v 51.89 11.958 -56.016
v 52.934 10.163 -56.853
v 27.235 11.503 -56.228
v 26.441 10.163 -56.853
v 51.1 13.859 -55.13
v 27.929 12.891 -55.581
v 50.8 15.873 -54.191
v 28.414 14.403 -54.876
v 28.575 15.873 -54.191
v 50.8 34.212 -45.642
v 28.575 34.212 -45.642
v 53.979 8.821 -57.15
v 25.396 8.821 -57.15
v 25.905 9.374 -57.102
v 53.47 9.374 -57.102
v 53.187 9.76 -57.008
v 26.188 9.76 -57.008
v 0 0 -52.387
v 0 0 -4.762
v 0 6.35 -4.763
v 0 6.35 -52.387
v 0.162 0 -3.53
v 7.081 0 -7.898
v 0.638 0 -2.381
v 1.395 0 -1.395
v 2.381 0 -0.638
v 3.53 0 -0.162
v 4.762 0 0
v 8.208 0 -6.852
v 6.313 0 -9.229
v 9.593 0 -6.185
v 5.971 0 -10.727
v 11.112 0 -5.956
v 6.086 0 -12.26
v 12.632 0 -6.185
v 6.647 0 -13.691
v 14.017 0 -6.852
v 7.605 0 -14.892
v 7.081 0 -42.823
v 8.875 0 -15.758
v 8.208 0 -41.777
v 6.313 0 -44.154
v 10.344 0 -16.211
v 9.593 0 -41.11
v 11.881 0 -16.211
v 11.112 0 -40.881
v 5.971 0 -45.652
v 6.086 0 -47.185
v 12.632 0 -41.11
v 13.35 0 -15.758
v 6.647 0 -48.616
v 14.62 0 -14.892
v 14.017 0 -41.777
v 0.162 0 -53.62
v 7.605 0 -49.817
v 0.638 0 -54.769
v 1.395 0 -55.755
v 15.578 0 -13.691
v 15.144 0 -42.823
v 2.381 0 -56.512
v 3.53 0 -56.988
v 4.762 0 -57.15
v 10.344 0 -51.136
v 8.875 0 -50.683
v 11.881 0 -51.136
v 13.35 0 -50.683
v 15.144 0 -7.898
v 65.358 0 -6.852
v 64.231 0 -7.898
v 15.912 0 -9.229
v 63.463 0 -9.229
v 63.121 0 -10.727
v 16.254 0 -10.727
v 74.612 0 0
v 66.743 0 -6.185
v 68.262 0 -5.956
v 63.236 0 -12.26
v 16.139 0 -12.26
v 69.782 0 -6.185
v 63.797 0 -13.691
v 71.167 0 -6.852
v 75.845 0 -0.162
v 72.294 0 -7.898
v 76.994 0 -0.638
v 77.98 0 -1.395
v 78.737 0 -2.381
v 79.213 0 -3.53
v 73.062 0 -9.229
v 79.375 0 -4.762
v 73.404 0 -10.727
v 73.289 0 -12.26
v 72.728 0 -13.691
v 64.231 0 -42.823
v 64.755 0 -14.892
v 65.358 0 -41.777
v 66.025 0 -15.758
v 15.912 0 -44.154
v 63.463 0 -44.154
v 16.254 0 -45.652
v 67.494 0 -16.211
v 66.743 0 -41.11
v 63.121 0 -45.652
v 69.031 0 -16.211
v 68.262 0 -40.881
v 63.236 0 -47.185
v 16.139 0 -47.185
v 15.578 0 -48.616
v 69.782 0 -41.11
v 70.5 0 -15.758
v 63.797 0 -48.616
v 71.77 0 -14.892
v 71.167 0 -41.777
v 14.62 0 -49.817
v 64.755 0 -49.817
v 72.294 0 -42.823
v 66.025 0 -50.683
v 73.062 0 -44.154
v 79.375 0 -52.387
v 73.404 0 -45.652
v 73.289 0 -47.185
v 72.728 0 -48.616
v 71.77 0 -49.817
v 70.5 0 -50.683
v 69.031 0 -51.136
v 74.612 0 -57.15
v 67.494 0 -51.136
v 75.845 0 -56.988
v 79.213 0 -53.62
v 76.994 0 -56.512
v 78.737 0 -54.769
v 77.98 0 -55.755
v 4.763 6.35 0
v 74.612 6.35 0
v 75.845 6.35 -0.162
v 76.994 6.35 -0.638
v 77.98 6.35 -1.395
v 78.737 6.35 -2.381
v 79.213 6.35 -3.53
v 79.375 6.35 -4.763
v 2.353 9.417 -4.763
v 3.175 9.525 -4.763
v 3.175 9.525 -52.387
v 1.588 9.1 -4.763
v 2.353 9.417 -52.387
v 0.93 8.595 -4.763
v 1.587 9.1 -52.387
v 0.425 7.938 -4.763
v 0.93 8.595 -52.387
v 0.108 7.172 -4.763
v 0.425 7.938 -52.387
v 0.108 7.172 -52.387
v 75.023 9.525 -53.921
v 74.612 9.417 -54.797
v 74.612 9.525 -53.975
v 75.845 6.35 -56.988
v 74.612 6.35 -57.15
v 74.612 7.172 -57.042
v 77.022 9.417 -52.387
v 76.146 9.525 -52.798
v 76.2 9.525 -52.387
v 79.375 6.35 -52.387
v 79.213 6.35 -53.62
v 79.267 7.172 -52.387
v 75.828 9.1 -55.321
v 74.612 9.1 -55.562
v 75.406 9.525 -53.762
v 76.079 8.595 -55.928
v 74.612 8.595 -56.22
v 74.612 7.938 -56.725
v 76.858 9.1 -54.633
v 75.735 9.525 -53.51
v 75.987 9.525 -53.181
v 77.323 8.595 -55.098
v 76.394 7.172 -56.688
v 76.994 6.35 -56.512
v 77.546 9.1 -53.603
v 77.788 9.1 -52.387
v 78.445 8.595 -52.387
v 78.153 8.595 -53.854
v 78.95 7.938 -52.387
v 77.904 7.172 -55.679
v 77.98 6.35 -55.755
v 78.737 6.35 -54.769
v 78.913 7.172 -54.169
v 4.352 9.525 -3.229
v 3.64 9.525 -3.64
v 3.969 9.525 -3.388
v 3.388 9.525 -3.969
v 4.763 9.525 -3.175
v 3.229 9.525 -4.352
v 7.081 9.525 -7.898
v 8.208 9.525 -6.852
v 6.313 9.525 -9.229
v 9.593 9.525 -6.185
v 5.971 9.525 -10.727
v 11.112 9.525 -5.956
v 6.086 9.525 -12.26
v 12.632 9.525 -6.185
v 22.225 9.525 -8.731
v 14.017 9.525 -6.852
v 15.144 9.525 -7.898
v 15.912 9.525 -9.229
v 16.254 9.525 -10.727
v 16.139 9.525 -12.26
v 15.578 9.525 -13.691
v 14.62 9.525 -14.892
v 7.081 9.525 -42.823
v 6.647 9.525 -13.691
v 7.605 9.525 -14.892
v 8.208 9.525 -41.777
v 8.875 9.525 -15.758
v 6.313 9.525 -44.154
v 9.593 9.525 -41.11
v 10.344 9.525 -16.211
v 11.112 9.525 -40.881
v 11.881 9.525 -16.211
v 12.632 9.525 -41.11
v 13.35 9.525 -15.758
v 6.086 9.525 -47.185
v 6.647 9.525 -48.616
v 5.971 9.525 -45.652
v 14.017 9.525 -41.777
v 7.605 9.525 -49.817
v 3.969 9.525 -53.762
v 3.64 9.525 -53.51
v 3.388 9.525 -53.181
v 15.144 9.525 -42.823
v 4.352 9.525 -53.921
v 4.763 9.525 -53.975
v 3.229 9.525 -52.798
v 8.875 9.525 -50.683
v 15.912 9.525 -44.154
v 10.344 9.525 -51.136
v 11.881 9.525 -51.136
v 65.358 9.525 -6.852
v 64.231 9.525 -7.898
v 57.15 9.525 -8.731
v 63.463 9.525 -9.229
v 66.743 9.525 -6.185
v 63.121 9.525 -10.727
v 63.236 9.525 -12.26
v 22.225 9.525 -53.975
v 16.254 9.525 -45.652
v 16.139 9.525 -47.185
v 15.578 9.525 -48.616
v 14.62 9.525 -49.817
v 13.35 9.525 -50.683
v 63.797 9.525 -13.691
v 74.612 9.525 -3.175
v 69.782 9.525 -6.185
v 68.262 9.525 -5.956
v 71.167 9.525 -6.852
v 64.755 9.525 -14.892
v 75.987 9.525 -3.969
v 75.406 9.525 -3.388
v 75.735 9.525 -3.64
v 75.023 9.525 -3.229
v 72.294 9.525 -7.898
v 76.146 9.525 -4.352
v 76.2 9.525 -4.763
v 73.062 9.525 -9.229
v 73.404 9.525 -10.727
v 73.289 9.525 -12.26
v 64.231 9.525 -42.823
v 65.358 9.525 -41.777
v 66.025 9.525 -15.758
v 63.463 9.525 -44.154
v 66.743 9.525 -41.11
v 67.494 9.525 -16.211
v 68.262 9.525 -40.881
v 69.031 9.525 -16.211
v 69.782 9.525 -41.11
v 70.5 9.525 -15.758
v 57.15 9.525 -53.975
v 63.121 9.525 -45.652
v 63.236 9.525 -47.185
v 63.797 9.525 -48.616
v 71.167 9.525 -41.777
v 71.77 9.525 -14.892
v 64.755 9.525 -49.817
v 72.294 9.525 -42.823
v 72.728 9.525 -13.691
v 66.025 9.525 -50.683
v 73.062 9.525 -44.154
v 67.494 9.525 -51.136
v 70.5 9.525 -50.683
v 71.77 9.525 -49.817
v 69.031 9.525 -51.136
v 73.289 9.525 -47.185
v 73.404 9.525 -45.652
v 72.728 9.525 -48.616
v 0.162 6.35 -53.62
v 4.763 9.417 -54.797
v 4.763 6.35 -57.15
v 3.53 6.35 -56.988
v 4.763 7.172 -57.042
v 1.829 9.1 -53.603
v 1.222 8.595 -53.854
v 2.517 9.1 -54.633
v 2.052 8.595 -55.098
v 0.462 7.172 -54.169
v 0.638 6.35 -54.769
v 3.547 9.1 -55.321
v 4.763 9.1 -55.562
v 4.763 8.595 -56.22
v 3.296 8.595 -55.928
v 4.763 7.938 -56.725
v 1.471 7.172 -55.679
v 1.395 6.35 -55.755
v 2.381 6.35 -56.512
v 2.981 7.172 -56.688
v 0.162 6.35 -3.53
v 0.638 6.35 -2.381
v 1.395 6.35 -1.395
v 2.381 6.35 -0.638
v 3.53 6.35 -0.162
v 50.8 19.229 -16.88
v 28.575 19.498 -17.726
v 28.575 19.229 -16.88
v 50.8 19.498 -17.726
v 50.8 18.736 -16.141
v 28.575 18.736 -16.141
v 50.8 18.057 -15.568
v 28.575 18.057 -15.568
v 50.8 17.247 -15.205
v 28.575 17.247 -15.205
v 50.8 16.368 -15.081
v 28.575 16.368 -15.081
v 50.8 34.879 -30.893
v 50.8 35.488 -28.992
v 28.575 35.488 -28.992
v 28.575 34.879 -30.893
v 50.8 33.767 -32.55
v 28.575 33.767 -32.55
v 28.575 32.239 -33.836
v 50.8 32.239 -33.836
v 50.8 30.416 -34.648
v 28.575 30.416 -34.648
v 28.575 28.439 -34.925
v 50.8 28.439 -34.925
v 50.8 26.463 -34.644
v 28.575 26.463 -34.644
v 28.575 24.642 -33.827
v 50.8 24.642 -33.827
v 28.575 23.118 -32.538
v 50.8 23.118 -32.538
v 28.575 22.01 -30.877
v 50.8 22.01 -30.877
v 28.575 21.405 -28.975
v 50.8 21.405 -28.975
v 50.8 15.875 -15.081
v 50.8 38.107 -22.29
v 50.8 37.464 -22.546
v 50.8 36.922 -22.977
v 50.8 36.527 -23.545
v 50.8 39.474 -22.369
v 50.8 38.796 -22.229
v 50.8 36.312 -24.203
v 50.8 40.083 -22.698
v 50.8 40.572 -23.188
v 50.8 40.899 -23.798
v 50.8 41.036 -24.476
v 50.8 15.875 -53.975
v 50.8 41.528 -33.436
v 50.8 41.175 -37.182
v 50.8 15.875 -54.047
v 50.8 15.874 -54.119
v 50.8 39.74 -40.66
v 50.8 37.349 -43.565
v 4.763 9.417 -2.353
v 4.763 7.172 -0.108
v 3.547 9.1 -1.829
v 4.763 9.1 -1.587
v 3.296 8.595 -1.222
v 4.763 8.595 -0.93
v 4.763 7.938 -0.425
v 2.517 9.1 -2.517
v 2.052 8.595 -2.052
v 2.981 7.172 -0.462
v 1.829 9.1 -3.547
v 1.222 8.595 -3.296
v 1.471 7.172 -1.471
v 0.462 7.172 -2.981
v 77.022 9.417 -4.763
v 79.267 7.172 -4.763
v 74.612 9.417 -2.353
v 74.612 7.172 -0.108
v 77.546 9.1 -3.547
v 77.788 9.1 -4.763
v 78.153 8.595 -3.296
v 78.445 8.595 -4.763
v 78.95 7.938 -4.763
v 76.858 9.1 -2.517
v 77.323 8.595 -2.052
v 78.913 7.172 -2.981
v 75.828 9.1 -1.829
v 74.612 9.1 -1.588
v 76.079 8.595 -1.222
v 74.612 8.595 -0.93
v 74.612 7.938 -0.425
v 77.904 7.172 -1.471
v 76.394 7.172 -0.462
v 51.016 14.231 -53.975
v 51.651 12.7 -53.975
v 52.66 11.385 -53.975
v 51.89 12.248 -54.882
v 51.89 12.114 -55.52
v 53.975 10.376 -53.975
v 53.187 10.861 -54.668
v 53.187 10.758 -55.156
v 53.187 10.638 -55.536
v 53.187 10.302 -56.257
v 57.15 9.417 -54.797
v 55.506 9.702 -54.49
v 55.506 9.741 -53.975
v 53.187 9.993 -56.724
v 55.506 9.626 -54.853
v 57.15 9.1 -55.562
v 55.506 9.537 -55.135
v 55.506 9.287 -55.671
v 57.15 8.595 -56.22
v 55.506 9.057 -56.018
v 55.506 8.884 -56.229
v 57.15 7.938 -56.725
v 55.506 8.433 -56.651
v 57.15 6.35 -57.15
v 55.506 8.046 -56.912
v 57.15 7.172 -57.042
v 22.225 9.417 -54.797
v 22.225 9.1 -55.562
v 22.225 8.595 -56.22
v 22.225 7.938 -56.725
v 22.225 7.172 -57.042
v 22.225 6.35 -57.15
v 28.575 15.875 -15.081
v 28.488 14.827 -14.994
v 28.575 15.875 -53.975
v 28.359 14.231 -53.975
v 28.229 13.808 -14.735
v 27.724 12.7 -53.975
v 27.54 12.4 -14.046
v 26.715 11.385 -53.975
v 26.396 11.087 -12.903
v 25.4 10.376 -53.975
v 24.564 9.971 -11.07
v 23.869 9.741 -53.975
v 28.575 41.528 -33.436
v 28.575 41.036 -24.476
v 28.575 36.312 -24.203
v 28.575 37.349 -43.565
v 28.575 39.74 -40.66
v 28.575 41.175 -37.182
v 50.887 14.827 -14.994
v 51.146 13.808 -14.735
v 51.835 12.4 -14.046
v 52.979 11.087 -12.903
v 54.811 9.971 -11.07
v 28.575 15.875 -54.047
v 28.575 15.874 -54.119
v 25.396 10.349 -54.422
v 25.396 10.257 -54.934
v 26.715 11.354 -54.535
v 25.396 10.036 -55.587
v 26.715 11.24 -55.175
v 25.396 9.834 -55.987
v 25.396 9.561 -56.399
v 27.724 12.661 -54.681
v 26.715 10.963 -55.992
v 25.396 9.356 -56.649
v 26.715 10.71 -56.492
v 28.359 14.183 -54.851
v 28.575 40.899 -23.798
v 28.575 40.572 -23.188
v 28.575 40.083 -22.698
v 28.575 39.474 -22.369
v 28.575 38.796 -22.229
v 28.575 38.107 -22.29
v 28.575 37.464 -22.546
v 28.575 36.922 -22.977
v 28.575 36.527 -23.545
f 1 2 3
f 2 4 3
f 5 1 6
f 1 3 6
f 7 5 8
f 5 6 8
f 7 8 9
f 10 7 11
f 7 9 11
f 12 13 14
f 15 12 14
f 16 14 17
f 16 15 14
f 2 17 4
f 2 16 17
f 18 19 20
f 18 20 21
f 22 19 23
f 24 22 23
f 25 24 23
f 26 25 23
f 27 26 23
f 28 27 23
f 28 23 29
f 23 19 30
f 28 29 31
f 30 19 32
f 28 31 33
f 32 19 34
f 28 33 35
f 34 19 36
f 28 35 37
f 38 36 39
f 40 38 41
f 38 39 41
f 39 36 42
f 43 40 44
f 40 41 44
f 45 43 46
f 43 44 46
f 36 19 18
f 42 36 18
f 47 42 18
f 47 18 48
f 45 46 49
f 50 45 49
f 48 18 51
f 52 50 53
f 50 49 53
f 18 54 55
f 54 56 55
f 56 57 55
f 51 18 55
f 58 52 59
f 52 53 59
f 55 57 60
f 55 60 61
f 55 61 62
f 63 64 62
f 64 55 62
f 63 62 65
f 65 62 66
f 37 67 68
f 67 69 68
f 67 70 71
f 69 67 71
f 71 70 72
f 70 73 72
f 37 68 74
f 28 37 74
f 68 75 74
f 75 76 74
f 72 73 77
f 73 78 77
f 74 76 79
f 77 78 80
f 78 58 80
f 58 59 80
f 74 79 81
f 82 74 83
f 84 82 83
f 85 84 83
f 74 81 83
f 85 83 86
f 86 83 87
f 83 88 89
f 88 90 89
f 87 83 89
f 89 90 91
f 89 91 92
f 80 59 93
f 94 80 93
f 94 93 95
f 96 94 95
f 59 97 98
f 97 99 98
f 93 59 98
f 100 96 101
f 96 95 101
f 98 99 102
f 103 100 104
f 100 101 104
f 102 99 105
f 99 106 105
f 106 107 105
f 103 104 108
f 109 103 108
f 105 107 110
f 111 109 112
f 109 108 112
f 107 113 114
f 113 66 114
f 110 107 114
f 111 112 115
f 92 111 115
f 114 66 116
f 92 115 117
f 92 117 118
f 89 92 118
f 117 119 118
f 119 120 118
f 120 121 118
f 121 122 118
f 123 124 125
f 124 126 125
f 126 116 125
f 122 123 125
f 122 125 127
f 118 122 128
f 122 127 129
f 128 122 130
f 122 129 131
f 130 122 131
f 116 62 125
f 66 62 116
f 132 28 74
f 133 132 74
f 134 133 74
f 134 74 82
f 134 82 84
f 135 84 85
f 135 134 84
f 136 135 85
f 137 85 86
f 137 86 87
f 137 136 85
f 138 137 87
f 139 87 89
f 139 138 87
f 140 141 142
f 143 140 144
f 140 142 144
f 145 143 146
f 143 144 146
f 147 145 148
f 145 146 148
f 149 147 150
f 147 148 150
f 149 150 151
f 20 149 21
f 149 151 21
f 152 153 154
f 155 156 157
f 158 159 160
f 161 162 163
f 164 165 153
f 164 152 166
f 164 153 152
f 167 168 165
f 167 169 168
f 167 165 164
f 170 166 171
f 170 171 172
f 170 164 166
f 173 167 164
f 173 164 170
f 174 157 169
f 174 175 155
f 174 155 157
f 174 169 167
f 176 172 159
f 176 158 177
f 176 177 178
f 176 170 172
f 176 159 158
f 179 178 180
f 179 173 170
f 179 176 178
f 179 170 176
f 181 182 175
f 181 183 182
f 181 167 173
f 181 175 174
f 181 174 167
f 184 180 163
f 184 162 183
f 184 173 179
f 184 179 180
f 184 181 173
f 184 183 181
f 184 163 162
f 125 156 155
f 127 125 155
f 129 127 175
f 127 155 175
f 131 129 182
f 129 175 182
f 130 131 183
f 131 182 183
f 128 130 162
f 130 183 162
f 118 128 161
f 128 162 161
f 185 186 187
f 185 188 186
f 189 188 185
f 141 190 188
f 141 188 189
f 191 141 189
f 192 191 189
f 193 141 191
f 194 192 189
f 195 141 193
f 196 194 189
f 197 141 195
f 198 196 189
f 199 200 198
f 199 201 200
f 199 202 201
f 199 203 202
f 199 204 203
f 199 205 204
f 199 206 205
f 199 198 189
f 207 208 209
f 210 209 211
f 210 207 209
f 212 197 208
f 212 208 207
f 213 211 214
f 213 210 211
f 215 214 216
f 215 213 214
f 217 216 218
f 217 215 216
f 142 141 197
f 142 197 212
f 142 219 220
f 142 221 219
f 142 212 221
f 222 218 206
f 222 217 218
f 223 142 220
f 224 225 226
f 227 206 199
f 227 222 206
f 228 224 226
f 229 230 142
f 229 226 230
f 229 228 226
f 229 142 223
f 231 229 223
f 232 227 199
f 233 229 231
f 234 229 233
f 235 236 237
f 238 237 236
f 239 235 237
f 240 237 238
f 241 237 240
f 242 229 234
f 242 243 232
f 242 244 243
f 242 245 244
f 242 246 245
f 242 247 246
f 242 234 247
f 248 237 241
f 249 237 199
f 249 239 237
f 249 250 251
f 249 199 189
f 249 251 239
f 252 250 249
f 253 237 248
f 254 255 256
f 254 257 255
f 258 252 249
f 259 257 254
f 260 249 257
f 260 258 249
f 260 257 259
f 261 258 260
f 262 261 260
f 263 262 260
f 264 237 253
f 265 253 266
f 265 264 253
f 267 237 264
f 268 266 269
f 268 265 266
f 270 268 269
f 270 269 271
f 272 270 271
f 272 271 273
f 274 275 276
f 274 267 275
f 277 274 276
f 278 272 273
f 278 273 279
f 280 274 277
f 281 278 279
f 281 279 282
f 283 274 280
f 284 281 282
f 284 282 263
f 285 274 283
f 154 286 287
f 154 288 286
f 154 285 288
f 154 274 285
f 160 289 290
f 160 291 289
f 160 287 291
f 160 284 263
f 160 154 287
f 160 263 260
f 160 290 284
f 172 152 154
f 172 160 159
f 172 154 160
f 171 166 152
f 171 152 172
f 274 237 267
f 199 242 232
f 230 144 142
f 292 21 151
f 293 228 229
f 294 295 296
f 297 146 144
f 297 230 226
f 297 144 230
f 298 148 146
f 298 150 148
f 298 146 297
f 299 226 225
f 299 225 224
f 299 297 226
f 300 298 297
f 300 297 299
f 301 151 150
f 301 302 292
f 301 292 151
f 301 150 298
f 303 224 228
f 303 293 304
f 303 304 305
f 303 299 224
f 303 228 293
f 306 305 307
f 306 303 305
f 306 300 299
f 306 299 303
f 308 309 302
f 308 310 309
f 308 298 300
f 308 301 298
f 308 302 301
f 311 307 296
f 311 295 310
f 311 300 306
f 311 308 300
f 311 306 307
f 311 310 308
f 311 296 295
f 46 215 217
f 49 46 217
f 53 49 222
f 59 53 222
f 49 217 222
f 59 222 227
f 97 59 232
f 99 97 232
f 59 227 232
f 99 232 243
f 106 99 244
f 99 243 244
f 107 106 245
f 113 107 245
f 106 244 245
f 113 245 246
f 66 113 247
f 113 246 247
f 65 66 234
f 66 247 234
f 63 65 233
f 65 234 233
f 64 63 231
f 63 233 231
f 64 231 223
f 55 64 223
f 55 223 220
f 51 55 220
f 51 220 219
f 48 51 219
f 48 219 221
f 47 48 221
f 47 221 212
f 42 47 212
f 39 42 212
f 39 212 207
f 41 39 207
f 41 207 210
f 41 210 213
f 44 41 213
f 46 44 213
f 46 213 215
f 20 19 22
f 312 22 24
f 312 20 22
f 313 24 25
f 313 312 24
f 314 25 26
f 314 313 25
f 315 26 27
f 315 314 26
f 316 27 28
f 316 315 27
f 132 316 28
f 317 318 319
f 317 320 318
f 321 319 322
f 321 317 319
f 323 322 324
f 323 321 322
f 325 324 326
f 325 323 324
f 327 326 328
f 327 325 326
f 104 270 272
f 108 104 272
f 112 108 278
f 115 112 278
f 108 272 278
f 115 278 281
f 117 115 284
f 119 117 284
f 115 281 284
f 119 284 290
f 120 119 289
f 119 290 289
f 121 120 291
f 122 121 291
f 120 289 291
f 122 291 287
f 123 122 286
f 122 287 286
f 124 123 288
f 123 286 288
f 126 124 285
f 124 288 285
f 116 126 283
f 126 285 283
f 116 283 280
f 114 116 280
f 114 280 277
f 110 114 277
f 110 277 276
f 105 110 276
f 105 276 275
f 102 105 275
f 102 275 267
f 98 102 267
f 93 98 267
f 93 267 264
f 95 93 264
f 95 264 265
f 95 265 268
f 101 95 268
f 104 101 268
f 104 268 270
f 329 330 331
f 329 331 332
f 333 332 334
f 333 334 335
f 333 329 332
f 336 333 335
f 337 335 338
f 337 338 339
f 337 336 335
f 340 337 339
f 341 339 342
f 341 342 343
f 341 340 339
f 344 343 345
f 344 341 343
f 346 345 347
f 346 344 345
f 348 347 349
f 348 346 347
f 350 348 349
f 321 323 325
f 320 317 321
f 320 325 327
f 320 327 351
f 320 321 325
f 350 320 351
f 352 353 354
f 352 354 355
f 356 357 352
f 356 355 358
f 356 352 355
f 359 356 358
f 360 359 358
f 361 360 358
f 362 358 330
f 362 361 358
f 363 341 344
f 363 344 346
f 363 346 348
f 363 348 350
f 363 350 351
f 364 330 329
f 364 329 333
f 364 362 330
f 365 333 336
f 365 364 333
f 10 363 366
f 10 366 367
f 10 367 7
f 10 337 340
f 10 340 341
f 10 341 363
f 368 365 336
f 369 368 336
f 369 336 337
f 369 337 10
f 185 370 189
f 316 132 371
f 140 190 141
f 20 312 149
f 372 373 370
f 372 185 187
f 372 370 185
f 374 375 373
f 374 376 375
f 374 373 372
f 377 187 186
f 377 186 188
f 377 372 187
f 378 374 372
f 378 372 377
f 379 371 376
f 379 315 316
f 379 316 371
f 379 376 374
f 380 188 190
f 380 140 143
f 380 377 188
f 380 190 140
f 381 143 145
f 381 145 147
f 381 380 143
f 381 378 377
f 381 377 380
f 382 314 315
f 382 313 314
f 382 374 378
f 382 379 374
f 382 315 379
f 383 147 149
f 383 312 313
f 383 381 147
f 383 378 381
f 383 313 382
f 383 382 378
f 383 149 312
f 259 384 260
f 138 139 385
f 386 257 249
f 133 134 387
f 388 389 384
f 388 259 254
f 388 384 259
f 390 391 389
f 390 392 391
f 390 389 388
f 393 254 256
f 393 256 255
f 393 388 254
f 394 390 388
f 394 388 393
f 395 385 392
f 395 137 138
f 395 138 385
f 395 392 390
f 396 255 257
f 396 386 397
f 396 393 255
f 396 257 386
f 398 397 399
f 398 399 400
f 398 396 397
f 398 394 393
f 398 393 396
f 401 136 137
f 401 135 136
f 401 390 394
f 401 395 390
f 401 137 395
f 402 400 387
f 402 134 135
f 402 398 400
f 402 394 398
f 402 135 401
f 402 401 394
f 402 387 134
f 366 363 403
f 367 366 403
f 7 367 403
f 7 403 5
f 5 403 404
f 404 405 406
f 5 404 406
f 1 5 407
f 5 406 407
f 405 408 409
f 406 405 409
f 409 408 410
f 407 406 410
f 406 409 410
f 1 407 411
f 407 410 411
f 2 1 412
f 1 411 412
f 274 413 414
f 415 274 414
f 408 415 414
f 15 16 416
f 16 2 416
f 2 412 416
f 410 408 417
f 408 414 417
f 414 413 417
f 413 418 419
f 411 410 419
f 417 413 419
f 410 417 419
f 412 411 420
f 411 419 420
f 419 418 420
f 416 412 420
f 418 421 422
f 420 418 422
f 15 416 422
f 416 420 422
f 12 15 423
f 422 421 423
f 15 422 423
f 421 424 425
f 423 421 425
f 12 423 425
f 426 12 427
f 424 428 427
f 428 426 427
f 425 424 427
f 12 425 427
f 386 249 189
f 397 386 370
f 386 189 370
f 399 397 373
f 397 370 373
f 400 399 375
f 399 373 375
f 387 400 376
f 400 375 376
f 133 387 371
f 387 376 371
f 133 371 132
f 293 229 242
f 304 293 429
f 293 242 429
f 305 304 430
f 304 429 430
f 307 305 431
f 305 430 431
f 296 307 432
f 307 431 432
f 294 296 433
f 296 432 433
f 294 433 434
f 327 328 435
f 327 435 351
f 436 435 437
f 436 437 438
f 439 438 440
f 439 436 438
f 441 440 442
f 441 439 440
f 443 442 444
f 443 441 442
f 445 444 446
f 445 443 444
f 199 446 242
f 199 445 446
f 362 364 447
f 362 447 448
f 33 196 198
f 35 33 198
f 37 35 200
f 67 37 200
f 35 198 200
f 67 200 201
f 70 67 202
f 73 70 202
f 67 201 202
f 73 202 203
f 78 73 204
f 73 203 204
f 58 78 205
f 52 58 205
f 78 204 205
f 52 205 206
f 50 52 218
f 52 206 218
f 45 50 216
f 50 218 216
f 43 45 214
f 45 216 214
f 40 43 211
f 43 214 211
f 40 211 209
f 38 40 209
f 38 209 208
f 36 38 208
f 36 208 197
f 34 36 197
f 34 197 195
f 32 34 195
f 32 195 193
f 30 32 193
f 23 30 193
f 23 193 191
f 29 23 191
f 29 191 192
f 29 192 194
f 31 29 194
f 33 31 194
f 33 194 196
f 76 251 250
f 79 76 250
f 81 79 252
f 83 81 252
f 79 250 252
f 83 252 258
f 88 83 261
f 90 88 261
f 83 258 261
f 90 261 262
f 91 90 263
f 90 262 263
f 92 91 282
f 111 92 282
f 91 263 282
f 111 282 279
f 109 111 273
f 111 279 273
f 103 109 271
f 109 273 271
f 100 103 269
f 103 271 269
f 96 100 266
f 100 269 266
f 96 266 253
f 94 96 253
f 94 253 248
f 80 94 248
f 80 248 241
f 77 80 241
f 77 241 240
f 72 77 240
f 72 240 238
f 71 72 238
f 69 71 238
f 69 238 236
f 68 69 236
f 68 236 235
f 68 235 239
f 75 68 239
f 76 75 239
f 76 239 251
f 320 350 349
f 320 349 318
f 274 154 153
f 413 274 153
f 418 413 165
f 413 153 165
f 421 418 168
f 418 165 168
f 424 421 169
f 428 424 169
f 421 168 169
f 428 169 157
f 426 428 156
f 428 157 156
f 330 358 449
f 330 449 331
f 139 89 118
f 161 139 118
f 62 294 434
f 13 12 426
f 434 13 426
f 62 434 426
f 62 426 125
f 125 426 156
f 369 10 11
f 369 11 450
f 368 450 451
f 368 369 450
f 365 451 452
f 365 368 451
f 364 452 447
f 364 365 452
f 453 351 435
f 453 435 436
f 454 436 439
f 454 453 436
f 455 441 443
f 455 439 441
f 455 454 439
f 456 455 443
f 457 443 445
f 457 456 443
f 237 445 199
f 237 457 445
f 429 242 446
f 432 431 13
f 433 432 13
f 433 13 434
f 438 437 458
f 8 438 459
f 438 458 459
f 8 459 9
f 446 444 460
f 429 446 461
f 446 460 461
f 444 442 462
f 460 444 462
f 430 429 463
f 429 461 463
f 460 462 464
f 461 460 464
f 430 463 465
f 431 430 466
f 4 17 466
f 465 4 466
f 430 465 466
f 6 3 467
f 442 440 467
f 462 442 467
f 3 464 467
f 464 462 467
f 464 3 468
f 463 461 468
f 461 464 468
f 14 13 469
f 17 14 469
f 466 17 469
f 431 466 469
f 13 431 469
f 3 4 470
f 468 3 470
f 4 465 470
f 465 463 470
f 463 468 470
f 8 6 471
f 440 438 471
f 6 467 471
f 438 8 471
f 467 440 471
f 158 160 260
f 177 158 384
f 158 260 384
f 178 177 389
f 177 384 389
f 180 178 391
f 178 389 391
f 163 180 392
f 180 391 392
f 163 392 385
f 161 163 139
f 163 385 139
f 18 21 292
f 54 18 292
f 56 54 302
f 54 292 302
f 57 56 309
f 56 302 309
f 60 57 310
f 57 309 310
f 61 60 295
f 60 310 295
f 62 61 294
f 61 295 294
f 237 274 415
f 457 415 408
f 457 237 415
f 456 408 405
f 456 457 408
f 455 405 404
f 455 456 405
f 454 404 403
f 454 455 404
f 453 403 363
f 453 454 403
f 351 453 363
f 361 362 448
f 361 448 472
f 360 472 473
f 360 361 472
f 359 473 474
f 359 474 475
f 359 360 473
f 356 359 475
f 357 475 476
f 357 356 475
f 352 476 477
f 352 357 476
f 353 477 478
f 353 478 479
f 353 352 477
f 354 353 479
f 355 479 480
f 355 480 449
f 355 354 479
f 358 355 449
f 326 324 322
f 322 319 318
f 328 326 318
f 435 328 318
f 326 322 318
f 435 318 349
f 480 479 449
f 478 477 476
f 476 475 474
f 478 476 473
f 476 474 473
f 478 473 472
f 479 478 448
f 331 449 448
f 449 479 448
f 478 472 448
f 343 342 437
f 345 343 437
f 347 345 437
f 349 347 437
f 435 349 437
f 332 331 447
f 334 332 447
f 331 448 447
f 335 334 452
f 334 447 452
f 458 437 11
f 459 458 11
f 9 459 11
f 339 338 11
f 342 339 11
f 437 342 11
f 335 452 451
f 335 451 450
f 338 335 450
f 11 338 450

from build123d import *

# Parameters (mm, degrees)
SKETCH1_W           = 79.375
SKETCH1_H           = 57.14999999999999
BASE_EXTRUDE_DEPTH  = 9.525
SKETCH2_R           = 5.1562
CUT_EXTRUDE1_DEPTH  = 99.27125088244273
BOSS_EXTRUDE1_DEPTH = 11.112499999999999
FILLET1_R           = 4.7625
FILLET3_R           = 3.175
FILLET5_R           = 6.35
FILLET6_R           = 3.175


with BuildPart() as part:
    # Sketch1 → Base-Extrude (new body)
    with BuildSketch(Plane(origin=(0, 0, 0), x_dir=(1, 0, 0), z_dir=(0, 1, 0))):
        with Locations((39.6875, 28.574999999999996)):
            Rectangle(SKETCH1_W, SKETCH1_H)
    extrude(amount=BASE_EXTRUDE_DEPTH)

    # Sketch2 → Cut-Extrude1 (cut, through all)
    with BuildSketch(Plane(origin=(0, 9.525, 0), x_dir=(-1, 0, 0), z_dir=(0, 1, 0))):
        with Locations(Location((-11.112499999999999, -46.037499999999994, 0), (0, 0, 90))):
            Circle(SKETCH2_R)
        with Locations(Location((-11.112499999999999, -11.112499999999997, 0), (0, 0, 90))):
            Circle(SKETCH2_R)
        with Locations(Location((-68.2625, -11.112499999999997, 0), (0, 0, 90))):
            Circle(SKETCH2_R)
        with Locations(Location((-68.2625, -46.037499999999994, 0), (0, 0, 90))):
            Circle(SKETCH2_R)
    extrude(amount=-CUT_EXTRUDE1_DEPTH, mode=Mode.SUBTRACT)

    # Sketch3 → Boss-Extrude1 (add, symmetric)
    with BuildSketch(Plane(origin=(39.6875, 0, 0), x_dir=(0, 0, -1), z_dir=(1, 0, 0))):
        with BuildLine():
            Line((15.081249999999999, 9.525), (57.15, 9.525))
            Line((57.15, 9.525), (45.642080901347875, 34.2124833053063))
            ThreePointArc((45.642080901347875, 34.2124833053063), (40.65983135726152, 39.74024710013013), (33.435990911126424, 41.52773480629668))
            Line((33.435990911126424, 41.52773480629668), (24.475888920836205, 41.03647902618064))
            ThreePointArc((24.475888920836205, 41.03647902618064), (22.228971581677126, 38.79627321294108), (24.202681662531663, 36.31199703436931))
            Line((24.202681662531663, 36.31199703436931), (28.991955012405008, 35.48840889689211))
            ThreePointArc((28.991955012405008, 35.48840889689211), (34.924994788062534, 28.439370658797703), (28.97494247235726, 21.40468669276046))
            Line((28.97494247235726, 21.40468669276046), (17.72572001228568, 19.498181673786302))
            ThreePointArc((17.72572001228568, 19.498181673786302), (15.830857484241669, 18.416745811263993), (15.081249999999997, 16.367820203902035))
            Line((15.081249999999997, 16.367820203902035), (15.081249999999999, 9.525))
        make_face()
    extrude(amount=BOSS_EXTRUDE1_DEPTH, both=True)

    # Fillet1
    fillet1_edges = [part.edges().sort_by_distance(p)[0] for p in [
        (0, 4.7625, -57.15),
        (79.375, 4.7625, -57.15),
        (79.375, 4.7625, 0),
        (0, 4.7625, 0),
    ]]
    fillet(fillet1_edges, radius=FILLET1_R)

    # Fillet3
    fillet3_edges = [part.edges().sort_by_distance(p)[0] for p in [
        (16.668750000000003, 9.525, -57.15),
        (39.6875, 9.525, 0),
        (0, 9.525, -28.575),
        (79.375, 9.525, -28.575),
        (62.70625, 9.525, -57.15),
        (77.98009604540093, 9.525, -55.75509604540093),
        (1.3949039545990662, 9.525, -55.75509604540093),
        (77.98009604540093, 9.525, -1.3949039545990662),
        (1.3949039545990667, 9.525, -1.3949039545990662),
    ]]
    fillet(fillet3_edges, radius=FILLET3_R)

    # Fillet5
    # the kernel refuses this fillet: 6.35 mm, written as the material it adds along each edge
    with BuildSketch(Plane(origin=(28.575000000000003, 9.525, -15.081249999999997), x_dir=(-1, 0, 0), z_dir=(0, 0, -1))) as fillet5_piece_1:
        with BuildLine():
            CenterArc((FILLET5_R, FILLET5_R), FILLET5_R, 180, 90)
            Line((0, FILLET5_R), (0, 0))
            Line((0, 0), (FILLET5_R, 0))
        make_face()
    extrude(amount=38.893750000000004)
    with BuildSketch(Plane(origin=(50.8, 9.525, -15.081249999999999), x_dir=(0, 0, 1), z_dir=(-1, 0, 0))) as fillet5_piece_2:
        with BuildLine():
            CenterArc((FILLET5_R, FILLET5_R), FILLET5_R, 180, 90)
            Line((3.55e-15, FILLET5_R), (0, 0))
            Line((0, 0), (FILLET5_R, 0))
        make_face()
    extrude(amount=22.224999999999994)
    with BuildSketch(Plane(origin=(50.8, 9.525, -15.081249999999997), x_dir=(1, 0, 0), z_dir=(0, 0, -1))) as fillet5_piece_3:
        with BuildLine():
            CenterArc((FILLET5_R, -FILLET5_R), FILLET5_R, 90, 90)
            Line((0, -FILLET5_R), (0, 0))
            Line((0, 0), (FILLET5_R, 0))
        make_face()
    extrude(amount=38.893750000000004)
    with BuildSketch(Plane(origin=(28.575000000000003, 6.350000000000001, -53.975), x_dir=(0, 1, 0), z_dir=(0, 0, 1))) as fillet5_piece_4_section:
        with BuildLine():
            CenterArc((3.174999999999999 + FILLET5_R, FILLET5_R), FILLET5_R, 180.00000000000003, 90)
            Line((3.174999999999999, FILLET5_R), (3.174999999999999, 0))
            Line((3.174999999999999, 0), (3.174999999999999 + FILLET5_R, 0))
        make_face()
    fillet5_piece_4 = revolve(axis=Axis((28.575000000000003, 6.350000000000001, -53.975), (-1, 0, 0)), revolution_arc=359.64000000000004, mode=Mode.PRIVATE)
    fillet5_piece_4 = split(fillet5_piece_4, bisect_by=Plane(origin=(28.575000000000003, 0, -53.975), z_dir=(0, 1, 0)), keep=Keep.TOP, mode=Mode.PRIVATE)
    fillet5_piece_4 = split(fillet5_piece_4, bisect_by=Plane(origin=(28.575000000000003, 6.350000000000001, -57.15), z_dir=(0, 0, 1)), keep=Keep.TOP, mode=Mode.PRIVATE)
    fillet5_piece_4 = split(fillet5_piece_4, bisect_by=Plane(origin=(28.575000000000003, 8.132568412888961, -57.799073453811204), z_dir=(0, -0.42249632325246483, 0.9063646379014071)), keep=Keep.TOP, mode=Mode.PRIVATE)
    add(fillet5_piece_4)
    with BuildSketch(Plane(origin=(50.8, 6.350000000000001, -53.975), x_dir=(0, 1, 0), z_dir=(0, 0, 1))) as fillet5_piece_5_section:
        with BuildLine():
            CenterArc((3.174999999999999 + FILLET5_R, -FILLET5_R), FILLET5_R, 90, 90)
            Line((3.174999999999999, -FILLET5_R), (3.174999999999999, 0))
            Line((3.174999999999999, 0), (3.174999999999999 + FILLET5_R, 0))
        make_face()
    fillet5_piece_5 = revolve(axis=Axis((50.8, 6.350000000000001, -53.975), (-1, 0, 0)), revolution_arc=359.64000000000004, mode=Mode.PRIVATE)
    fillet5_piece_5 = split(fillet5_piece_5, bisect_by=Plane(origin=(50.8, 0, -53.975), z_dir=(0, 1, 0)), keep=Keep.TOP, mode=Mode.PRIVATE)
    fillet5_piece_5 = split(fillet5_piece_5, bisect_by=Plane(origin=(50.8, 6.350000000000001, -57.15), z_dir=(0, 0, 1)), keep=Keep.TOP, mode=Mode.PRIVATE)
    fillet5_piece_5 = split(fillet5_piece_5, bisect_by=Plane(origin=(50.8, 8.132568412888961, -57.799073453811204), z_dir=(0, -0.42249632325246483, 0.9063646379014071)), keep=Keep.TOP, mode=Mode.PRIVATE)
    add(fillet5_piece_5)
    with BuildSketch(Plane(origin=(28.575000000000003, 9.525, 0.7937500000000028), x_dir=(-1, 0, 0), z_dir=(0, 0, -1))) as fillet5_piece_6a_section:
        with BuildLine():
            CenterArc((FILLET5_R, FILLET5_R), FILLET5_R, 180, 90)
            Line((0, FILLET5_R), (0, 0))
            Line((0, 0), (FILLET5_R, 0))
        make_face()
    fillet5_piece_6a = extrude(amount=54.768750000000004, mode=Mode.PRIVATE)
    fillet5_piece_6a = split(fillet5_piece_6a, bisect_by=Plane(origin=(28.575000000000003, 9.525000000000004, -15.081249999999999), z_dir=(0, -2.6e-16, 1)), keep=Keep.TOP, mode=Mode.PRIVATE)
    with BuildSketch(Plane(origin=(50.8, 9.525, -15.081249999999999), x_dir=(0, 0, 1), z_dir=(-1, 0, 0))) as fillet5_piece_6b_section:
        with BuildLine():
            CenterArc((FILLET5_R, FILLET5_R), FILLET5_R, 180, 90)
            Line((3.55e-15, FILLET5_R), (0, 0))
            Line((0, 0), (FILLET5_R, 0))
        make_face()
    fillet5_piece_6b = extrude(amount=38.1, mode=Mode.PRIVATE)
    fillet5_piece_6b = fillet5_piece_6b - Plane(origin=(11.112499999999999, 9.525, -11.112499999999997), x_dir=(-6e-17, 0, 1), z_dir=(0, 1, 0)) * Cylinder(5.1562, 102, mode=Mode.PRIVATE)
    fillet5_piece_6b = split(fillet5_piece_6b, bisect_by=Plane(origin=(28.575000000000003, 9.525, -15.081249999999999), z_dir=(-1, 0, 0)), keep=Keep.TOP, mode=Mode.PRIVATE)
    fillet5_piece_6 = fillet5_piece_6a & fillet5_piece_6b
    add(fillet5_piece_6)
    with BuildSketch(Plane(origin=(66.675, 9.525, -15.081249999999999), x_dir=(0, 0, 1), z_dir=(-1, 0, 0))) as fillet5_piece_7a_section:
        with BuildLine():
            CenterArc((FILLET5_R, FILLET5_R), FILLET5_R, 180, 90)
            Line((3.55e-15, FILLET5_R), (0, 0))
            Line((0, 0), (FILLET5_R, 0))
        make_face()
    fillet5_piece_7a = extrude(amount=38.099999999999994, mode=Mode.PRIVATE)
    fillet5_piece_7a = fillet5_piece_7a - Plane(origin=(68.2625, 9.525, -11.112499999999997), x_dir=(-6e-17, 0, 1), z_dir=(0, 1, 0)) * Cylinder(5.1562, 102, mode=Mode.PRIVATE)
    fillet5_piece_7a = split(fillet5_piece_7a, bisect_by=Plane(origin=(50.8, 9.525, -15.081249999999999), z_dir=(1, 0, 0)), keep=Keep.TOP, mode=Mode.PRIVATE)
    with BuildSketch(Plane(origin=(50.8, 9.525, 0.7937500000000028), x_dir=(1, 0, 0), z_dir=(0, 0, -1))) as fillet5_piece_7b_section:
        with BuildLine():
            CenterArc((FILLET5_R, -FILLET5_R), FILLET5_R, 90, 90)
            Line((0, -FILLET5_R), (0, 0))
            Line((0, 0), (FILLET5_R, 0))
        make_face()
    fillet5_piece_7b = extrude(amount=54.768750000000004, mode=Mode.PRIVATE)
    fillet5_piece_7b = split(fillet5_piece_7b, bisect_by=Plane(origin=(50.8, 9.525000000000004, -15.081249999999999), z_dir=(0, -2.6e-16, 1)), keep=Keep.TOP, mode=Mode.PRIVATE)
    fillet5_piece_7 = fillet5_piece_7a & fillet5_piece_7b
    add(fillet5_piece_7)

    # Fillet6
    fillet6_edges = [part.edges().sort_by_distance(p)[0] for p in [
        (39.6875, 9.525000000000507, -57.150000000000006),
    ]]
    fillet(fillet6_edges, radius=FILLET6_R)


solid = part.part
